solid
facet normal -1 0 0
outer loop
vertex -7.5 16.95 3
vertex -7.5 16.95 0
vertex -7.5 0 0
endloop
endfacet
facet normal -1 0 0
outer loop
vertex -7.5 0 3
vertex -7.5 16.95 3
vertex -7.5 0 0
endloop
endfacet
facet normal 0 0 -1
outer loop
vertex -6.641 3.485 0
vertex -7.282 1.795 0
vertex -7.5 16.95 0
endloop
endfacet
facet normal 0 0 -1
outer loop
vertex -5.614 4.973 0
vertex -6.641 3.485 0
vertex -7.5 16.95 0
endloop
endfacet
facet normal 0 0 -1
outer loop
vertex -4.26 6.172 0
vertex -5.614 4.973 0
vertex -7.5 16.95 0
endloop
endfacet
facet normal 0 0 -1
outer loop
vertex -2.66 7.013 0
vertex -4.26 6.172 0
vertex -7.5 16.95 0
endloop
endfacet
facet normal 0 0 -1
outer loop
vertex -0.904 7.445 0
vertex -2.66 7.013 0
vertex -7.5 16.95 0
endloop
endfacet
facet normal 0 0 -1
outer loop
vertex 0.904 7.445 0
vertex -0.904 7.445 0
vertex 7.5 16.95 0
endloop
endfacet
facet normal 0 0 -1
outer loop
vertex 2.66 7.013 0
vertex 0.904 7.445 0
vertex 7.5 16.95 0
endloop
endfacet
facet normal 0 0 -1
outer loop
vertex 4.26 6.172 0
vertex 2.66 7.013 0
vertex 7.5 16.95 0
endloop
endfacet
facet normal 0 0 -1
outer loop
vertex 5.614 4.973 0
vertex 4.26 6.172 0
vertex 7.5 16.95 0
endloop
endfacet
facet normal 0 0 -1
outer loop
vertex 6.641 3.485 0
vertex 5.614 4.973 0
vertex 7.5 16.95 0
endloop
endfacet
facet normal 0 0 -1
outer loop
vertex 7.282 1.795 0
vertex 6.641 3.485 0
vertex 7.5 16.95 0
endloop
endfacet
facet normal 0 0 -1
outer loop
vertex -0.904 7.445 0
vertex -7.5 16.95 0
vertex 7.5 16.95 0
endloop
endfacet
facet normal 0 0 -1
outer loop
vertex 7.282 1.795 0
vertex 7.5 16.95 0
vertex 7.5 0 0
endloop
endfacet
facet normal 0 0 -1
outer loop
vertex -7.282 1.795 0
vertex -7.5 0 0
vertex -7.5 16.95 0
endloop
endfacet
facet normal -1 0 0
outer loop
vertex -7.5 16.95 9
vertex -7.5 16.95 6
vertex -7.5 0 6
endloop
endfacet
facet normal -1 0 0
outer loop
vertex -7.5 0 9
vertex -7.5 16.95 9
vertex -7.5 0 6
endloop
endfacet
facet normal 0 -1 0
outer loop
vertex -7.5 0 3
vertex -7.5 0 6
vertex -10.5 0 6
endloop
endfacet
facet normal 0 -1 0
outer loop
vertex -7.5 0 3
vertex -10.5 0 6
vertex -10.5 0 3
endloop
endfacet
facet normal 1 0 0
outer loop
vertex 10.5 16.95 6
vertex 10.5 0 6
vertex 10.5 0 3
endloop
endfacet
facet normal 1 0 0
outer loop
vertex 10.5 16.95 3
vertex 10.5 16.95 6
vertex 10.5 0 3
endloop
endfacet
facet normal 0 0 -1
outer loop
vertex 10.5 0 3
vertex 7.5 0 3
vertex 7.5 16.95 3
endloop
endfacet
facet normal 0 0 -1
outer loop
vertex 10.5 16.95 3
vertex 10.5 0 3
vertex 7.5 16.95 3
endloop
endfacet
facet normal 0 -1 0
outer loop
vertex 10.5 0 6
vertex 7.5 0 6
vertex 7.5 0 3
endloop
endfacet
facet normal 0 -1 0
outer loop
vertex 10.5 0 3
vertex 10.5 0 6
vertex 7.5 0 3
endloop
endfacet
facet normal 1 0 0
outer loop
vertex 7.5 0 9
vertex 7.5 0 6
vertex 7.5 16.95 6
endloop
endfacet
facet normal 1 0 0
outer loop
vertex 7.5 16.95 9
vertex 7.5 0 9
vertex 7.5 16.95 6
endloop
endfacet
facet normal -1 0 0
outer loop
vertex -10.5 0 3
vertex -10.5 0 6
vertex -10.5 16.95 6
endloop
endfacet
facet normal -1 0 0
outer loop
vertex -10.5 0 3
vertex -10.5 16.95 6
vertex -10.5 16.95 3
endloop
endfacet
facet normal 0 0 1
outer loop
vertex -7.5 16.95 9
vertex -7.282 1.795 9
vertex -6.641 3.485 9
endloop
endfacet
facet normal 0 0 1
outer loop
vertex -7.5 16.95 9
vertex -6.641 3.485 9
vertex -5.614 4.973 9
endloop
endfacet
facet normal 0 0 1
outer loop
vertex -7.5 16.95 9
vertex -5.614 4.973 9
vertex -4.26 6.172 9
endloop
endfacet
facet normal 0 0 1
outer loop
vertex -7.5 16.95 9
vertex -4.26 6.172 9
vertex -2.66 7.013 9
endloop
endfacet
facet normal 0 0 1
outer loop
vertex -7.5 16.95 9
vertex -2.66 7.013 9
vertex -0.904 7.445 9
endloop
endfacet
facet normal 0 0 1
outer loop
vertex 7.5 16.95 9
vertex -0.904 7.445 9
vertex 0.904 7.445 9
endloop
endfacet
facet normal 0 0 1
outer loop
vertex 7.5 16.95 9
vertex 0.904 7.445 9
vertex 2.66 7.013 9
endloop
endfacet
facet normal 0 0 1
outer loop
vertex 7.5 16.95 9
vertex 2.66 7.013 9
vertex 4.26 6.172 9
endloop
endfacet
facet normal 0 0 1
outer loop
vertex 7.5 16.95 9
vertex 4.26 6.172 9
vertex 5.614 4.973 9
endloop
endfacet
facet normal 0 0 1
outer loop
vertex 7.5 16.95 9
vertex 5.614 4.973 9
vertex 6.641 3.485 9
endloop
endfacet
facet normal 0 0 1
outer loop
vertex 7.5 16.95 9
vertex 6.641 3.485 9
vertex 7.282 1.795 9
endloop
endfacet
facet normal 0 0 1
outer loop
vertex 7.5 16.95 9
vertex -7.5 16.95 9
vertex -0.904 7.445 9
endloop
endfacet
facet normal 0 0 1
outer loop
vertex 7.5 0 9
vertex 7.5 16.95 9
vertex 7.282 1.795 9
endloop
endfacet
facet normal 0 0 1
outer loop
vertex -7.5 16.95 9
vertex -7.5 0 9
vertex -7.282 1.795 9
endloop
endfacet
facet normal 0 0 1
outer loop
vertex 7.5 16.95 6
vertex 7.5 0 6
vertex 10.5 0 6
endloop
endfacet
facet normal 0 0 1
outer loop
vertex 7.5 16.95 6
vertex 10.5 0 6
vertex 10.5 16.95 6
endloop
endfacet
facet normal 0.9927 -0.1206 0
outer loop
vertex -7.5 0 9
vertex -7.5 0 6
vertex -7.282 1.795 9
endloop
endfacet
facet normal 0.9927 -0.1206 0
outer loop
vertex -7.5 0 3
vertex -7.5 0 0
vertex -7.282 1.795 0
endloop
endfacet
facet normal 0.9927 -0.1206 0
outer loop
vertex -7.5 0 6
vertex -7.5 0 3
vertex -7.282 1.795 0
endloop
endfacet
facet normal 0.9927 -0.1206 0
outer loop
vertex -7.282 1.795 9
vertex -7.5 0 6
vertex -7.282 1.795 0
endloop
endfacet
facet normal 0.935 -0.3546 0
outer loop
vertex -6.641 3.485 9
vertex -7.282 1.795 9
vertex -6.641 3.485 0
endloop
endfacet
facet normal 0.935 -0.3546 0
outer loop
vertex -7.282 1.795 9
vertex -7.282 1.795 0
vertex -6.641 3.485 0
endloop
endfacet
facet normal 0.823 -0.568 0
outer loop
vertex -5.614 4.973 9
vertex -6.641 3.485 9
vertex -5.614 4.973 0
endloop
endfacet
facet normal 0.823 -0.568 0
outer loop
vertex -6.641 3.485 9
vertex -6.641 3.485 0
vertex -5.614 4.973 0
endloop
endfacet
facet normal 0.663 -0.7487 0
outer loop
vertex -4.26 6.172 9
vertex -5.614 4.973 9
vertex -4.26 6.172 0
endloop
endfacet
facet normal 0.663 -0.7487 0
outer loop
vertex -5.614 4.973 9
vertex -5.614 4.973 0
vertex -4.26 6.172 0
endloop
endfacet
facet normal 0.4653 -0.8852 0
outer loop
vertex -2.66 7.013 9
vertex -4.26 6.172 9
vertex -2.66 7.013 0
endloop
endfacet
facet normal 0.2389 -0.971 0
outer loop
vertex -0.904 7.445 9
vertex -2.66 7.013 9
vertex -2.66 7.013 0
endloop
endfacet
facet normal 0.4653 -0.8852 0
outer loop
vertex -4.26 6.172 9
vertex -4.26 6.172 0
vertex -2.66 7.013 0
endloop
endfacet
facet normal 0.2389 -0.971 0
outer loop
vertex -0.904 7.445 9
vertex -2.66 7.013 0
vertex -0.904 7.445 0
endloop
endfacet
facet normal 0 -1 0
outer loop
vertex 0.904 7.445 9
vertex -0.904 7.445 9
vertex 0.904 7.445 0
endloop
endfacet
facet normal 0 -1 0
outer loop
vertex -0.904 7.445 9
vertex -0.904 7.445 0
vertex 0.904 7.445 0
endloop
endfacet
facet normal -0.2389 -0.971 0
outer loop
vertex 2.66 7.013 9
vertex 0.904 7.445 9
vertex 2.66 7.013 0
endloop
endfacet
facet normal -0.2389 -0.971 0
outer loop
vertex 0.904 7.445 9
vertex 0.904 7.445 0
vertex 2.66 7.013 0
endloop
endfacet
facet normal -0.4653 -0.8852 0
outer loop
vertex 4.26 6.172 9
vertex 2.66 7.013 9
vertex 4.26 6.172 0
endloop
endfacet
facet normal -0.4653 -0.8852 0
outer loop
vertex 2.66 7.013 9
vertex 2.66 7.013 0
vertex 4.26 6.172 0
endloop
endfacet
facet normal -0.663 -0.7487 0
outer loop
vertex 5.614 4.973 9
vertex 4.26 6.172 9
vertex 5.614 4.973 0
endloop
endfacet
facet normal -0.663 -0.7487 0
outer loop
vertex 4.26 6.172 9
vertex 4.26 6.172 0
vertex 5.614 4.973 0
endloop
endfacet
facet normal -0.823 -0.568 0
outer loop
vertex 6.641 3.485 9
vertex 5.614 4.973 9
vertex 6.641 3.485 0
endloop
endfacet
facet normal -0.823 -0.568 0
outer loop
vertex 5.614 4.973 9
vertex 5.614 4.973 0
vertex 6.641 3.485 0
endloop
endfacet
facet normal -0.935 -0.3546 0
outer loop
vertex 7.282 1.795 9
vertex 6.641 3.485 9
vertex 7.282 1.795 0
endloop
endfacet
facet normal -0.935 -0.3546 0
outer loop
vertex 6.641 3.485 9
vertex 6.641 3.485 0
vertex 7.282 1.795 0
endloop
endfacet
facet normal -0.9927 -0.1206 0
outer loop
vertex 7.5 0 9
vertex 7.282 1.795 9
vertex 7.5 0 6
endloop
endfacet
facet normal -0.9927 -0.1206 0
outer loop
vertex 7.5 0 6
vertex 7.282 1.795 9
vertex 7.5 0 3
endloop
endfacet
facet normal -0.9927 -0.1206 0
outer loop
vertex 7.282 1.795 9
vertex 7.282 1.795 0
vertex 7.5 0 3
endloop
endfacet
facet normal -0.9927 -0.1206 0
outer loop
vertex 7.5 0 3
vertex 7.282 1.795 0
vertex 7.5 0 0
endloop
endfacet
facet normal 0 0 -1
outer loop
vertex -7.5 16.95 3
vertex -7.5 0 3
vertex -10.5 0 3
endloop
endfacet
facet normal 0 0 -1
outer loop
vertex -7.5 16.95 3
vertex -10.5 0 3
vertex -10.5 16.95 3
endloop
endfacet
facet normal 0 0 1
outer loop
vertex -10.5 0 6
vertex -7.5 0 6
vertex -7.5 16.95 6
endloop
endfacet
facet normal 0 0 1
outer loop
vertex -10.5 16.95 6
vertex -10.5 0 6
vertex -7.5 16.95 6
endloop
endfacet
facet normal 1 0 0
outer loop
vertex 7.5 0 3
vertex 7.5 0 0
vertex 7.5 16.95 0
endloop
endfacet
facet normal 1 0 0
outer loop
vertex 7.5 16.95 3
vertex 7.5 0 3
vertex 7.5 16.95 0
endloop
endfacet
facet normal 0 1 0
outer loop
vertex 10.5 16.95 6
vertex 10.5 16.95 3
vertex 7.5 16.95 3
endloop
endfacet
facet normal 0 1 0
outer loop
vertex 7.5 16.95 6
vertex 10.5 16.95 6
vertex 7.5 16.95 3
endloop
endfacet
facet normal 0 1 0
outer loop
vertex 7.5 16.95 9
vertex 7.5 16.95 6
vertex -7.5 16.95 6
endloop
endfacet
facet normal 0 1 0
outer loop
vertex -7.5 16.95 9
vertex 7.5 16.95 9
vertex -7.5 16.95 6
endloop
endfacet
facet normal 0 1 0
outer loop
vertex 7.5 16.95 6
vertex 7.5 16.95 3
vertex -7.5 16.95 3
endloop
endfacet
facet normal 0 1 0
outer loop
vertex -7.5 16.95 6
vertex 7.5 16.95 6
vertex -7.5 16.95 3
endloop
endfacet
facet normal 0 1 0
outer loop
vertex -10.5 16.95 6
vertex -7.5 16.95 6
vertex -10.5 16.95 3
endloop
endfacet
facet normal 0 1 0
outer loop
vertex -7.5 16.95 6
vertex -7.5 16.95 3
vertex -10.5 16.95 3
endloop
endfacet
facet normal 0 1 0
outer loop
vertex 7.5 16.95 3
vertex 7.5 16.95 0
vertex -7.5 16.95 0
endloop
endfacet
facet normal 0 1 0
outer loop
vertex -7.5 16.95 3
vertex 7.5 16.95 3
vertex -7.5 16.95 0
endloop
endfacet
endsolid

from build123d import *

# Parameters (mm, degrees)
EXTRUDE1_DEPTH = 9
SKETCH2_W      = 3
SKETCH2_H      = 16.95
EXTRUDE2_DEPTH = 3


with BuildPart() as part:
    # Sketch1 → Extrude1 (new body)
    with BuildSketch(Plane.XY):
        with BuildLine():
            Line((7.5, 0), (7.5, 16.95))
            Line((7.5, 16.95), (-7.5, 16.95))
            Line((-7.5, 16.95), (-7.5, 0))
            ThreePointArc((-7.5, 0), (0, 7.5), (7.5, 0))
        make_face()
    extrude(amount=EXTRUDE1_DEPTH)

    # Sketch2 → Extrude2 (add)
    with BuildSketch(Plane(origin=(7.5, 0, 0), x_dir=(0, 0, -1), z_dir=(1, 0, 0))):
        with Locations((-4.5, 8.475)):
            Rectangle(SKETCH2_W, SKETCH2_H)
    extrude2 = extrude(amount=EXTRUDE2_DEPTH)

    # Mirror1: Extrude2 across plane
    add(extrude2.mirror(Plane.ZY))


solid = part.part
